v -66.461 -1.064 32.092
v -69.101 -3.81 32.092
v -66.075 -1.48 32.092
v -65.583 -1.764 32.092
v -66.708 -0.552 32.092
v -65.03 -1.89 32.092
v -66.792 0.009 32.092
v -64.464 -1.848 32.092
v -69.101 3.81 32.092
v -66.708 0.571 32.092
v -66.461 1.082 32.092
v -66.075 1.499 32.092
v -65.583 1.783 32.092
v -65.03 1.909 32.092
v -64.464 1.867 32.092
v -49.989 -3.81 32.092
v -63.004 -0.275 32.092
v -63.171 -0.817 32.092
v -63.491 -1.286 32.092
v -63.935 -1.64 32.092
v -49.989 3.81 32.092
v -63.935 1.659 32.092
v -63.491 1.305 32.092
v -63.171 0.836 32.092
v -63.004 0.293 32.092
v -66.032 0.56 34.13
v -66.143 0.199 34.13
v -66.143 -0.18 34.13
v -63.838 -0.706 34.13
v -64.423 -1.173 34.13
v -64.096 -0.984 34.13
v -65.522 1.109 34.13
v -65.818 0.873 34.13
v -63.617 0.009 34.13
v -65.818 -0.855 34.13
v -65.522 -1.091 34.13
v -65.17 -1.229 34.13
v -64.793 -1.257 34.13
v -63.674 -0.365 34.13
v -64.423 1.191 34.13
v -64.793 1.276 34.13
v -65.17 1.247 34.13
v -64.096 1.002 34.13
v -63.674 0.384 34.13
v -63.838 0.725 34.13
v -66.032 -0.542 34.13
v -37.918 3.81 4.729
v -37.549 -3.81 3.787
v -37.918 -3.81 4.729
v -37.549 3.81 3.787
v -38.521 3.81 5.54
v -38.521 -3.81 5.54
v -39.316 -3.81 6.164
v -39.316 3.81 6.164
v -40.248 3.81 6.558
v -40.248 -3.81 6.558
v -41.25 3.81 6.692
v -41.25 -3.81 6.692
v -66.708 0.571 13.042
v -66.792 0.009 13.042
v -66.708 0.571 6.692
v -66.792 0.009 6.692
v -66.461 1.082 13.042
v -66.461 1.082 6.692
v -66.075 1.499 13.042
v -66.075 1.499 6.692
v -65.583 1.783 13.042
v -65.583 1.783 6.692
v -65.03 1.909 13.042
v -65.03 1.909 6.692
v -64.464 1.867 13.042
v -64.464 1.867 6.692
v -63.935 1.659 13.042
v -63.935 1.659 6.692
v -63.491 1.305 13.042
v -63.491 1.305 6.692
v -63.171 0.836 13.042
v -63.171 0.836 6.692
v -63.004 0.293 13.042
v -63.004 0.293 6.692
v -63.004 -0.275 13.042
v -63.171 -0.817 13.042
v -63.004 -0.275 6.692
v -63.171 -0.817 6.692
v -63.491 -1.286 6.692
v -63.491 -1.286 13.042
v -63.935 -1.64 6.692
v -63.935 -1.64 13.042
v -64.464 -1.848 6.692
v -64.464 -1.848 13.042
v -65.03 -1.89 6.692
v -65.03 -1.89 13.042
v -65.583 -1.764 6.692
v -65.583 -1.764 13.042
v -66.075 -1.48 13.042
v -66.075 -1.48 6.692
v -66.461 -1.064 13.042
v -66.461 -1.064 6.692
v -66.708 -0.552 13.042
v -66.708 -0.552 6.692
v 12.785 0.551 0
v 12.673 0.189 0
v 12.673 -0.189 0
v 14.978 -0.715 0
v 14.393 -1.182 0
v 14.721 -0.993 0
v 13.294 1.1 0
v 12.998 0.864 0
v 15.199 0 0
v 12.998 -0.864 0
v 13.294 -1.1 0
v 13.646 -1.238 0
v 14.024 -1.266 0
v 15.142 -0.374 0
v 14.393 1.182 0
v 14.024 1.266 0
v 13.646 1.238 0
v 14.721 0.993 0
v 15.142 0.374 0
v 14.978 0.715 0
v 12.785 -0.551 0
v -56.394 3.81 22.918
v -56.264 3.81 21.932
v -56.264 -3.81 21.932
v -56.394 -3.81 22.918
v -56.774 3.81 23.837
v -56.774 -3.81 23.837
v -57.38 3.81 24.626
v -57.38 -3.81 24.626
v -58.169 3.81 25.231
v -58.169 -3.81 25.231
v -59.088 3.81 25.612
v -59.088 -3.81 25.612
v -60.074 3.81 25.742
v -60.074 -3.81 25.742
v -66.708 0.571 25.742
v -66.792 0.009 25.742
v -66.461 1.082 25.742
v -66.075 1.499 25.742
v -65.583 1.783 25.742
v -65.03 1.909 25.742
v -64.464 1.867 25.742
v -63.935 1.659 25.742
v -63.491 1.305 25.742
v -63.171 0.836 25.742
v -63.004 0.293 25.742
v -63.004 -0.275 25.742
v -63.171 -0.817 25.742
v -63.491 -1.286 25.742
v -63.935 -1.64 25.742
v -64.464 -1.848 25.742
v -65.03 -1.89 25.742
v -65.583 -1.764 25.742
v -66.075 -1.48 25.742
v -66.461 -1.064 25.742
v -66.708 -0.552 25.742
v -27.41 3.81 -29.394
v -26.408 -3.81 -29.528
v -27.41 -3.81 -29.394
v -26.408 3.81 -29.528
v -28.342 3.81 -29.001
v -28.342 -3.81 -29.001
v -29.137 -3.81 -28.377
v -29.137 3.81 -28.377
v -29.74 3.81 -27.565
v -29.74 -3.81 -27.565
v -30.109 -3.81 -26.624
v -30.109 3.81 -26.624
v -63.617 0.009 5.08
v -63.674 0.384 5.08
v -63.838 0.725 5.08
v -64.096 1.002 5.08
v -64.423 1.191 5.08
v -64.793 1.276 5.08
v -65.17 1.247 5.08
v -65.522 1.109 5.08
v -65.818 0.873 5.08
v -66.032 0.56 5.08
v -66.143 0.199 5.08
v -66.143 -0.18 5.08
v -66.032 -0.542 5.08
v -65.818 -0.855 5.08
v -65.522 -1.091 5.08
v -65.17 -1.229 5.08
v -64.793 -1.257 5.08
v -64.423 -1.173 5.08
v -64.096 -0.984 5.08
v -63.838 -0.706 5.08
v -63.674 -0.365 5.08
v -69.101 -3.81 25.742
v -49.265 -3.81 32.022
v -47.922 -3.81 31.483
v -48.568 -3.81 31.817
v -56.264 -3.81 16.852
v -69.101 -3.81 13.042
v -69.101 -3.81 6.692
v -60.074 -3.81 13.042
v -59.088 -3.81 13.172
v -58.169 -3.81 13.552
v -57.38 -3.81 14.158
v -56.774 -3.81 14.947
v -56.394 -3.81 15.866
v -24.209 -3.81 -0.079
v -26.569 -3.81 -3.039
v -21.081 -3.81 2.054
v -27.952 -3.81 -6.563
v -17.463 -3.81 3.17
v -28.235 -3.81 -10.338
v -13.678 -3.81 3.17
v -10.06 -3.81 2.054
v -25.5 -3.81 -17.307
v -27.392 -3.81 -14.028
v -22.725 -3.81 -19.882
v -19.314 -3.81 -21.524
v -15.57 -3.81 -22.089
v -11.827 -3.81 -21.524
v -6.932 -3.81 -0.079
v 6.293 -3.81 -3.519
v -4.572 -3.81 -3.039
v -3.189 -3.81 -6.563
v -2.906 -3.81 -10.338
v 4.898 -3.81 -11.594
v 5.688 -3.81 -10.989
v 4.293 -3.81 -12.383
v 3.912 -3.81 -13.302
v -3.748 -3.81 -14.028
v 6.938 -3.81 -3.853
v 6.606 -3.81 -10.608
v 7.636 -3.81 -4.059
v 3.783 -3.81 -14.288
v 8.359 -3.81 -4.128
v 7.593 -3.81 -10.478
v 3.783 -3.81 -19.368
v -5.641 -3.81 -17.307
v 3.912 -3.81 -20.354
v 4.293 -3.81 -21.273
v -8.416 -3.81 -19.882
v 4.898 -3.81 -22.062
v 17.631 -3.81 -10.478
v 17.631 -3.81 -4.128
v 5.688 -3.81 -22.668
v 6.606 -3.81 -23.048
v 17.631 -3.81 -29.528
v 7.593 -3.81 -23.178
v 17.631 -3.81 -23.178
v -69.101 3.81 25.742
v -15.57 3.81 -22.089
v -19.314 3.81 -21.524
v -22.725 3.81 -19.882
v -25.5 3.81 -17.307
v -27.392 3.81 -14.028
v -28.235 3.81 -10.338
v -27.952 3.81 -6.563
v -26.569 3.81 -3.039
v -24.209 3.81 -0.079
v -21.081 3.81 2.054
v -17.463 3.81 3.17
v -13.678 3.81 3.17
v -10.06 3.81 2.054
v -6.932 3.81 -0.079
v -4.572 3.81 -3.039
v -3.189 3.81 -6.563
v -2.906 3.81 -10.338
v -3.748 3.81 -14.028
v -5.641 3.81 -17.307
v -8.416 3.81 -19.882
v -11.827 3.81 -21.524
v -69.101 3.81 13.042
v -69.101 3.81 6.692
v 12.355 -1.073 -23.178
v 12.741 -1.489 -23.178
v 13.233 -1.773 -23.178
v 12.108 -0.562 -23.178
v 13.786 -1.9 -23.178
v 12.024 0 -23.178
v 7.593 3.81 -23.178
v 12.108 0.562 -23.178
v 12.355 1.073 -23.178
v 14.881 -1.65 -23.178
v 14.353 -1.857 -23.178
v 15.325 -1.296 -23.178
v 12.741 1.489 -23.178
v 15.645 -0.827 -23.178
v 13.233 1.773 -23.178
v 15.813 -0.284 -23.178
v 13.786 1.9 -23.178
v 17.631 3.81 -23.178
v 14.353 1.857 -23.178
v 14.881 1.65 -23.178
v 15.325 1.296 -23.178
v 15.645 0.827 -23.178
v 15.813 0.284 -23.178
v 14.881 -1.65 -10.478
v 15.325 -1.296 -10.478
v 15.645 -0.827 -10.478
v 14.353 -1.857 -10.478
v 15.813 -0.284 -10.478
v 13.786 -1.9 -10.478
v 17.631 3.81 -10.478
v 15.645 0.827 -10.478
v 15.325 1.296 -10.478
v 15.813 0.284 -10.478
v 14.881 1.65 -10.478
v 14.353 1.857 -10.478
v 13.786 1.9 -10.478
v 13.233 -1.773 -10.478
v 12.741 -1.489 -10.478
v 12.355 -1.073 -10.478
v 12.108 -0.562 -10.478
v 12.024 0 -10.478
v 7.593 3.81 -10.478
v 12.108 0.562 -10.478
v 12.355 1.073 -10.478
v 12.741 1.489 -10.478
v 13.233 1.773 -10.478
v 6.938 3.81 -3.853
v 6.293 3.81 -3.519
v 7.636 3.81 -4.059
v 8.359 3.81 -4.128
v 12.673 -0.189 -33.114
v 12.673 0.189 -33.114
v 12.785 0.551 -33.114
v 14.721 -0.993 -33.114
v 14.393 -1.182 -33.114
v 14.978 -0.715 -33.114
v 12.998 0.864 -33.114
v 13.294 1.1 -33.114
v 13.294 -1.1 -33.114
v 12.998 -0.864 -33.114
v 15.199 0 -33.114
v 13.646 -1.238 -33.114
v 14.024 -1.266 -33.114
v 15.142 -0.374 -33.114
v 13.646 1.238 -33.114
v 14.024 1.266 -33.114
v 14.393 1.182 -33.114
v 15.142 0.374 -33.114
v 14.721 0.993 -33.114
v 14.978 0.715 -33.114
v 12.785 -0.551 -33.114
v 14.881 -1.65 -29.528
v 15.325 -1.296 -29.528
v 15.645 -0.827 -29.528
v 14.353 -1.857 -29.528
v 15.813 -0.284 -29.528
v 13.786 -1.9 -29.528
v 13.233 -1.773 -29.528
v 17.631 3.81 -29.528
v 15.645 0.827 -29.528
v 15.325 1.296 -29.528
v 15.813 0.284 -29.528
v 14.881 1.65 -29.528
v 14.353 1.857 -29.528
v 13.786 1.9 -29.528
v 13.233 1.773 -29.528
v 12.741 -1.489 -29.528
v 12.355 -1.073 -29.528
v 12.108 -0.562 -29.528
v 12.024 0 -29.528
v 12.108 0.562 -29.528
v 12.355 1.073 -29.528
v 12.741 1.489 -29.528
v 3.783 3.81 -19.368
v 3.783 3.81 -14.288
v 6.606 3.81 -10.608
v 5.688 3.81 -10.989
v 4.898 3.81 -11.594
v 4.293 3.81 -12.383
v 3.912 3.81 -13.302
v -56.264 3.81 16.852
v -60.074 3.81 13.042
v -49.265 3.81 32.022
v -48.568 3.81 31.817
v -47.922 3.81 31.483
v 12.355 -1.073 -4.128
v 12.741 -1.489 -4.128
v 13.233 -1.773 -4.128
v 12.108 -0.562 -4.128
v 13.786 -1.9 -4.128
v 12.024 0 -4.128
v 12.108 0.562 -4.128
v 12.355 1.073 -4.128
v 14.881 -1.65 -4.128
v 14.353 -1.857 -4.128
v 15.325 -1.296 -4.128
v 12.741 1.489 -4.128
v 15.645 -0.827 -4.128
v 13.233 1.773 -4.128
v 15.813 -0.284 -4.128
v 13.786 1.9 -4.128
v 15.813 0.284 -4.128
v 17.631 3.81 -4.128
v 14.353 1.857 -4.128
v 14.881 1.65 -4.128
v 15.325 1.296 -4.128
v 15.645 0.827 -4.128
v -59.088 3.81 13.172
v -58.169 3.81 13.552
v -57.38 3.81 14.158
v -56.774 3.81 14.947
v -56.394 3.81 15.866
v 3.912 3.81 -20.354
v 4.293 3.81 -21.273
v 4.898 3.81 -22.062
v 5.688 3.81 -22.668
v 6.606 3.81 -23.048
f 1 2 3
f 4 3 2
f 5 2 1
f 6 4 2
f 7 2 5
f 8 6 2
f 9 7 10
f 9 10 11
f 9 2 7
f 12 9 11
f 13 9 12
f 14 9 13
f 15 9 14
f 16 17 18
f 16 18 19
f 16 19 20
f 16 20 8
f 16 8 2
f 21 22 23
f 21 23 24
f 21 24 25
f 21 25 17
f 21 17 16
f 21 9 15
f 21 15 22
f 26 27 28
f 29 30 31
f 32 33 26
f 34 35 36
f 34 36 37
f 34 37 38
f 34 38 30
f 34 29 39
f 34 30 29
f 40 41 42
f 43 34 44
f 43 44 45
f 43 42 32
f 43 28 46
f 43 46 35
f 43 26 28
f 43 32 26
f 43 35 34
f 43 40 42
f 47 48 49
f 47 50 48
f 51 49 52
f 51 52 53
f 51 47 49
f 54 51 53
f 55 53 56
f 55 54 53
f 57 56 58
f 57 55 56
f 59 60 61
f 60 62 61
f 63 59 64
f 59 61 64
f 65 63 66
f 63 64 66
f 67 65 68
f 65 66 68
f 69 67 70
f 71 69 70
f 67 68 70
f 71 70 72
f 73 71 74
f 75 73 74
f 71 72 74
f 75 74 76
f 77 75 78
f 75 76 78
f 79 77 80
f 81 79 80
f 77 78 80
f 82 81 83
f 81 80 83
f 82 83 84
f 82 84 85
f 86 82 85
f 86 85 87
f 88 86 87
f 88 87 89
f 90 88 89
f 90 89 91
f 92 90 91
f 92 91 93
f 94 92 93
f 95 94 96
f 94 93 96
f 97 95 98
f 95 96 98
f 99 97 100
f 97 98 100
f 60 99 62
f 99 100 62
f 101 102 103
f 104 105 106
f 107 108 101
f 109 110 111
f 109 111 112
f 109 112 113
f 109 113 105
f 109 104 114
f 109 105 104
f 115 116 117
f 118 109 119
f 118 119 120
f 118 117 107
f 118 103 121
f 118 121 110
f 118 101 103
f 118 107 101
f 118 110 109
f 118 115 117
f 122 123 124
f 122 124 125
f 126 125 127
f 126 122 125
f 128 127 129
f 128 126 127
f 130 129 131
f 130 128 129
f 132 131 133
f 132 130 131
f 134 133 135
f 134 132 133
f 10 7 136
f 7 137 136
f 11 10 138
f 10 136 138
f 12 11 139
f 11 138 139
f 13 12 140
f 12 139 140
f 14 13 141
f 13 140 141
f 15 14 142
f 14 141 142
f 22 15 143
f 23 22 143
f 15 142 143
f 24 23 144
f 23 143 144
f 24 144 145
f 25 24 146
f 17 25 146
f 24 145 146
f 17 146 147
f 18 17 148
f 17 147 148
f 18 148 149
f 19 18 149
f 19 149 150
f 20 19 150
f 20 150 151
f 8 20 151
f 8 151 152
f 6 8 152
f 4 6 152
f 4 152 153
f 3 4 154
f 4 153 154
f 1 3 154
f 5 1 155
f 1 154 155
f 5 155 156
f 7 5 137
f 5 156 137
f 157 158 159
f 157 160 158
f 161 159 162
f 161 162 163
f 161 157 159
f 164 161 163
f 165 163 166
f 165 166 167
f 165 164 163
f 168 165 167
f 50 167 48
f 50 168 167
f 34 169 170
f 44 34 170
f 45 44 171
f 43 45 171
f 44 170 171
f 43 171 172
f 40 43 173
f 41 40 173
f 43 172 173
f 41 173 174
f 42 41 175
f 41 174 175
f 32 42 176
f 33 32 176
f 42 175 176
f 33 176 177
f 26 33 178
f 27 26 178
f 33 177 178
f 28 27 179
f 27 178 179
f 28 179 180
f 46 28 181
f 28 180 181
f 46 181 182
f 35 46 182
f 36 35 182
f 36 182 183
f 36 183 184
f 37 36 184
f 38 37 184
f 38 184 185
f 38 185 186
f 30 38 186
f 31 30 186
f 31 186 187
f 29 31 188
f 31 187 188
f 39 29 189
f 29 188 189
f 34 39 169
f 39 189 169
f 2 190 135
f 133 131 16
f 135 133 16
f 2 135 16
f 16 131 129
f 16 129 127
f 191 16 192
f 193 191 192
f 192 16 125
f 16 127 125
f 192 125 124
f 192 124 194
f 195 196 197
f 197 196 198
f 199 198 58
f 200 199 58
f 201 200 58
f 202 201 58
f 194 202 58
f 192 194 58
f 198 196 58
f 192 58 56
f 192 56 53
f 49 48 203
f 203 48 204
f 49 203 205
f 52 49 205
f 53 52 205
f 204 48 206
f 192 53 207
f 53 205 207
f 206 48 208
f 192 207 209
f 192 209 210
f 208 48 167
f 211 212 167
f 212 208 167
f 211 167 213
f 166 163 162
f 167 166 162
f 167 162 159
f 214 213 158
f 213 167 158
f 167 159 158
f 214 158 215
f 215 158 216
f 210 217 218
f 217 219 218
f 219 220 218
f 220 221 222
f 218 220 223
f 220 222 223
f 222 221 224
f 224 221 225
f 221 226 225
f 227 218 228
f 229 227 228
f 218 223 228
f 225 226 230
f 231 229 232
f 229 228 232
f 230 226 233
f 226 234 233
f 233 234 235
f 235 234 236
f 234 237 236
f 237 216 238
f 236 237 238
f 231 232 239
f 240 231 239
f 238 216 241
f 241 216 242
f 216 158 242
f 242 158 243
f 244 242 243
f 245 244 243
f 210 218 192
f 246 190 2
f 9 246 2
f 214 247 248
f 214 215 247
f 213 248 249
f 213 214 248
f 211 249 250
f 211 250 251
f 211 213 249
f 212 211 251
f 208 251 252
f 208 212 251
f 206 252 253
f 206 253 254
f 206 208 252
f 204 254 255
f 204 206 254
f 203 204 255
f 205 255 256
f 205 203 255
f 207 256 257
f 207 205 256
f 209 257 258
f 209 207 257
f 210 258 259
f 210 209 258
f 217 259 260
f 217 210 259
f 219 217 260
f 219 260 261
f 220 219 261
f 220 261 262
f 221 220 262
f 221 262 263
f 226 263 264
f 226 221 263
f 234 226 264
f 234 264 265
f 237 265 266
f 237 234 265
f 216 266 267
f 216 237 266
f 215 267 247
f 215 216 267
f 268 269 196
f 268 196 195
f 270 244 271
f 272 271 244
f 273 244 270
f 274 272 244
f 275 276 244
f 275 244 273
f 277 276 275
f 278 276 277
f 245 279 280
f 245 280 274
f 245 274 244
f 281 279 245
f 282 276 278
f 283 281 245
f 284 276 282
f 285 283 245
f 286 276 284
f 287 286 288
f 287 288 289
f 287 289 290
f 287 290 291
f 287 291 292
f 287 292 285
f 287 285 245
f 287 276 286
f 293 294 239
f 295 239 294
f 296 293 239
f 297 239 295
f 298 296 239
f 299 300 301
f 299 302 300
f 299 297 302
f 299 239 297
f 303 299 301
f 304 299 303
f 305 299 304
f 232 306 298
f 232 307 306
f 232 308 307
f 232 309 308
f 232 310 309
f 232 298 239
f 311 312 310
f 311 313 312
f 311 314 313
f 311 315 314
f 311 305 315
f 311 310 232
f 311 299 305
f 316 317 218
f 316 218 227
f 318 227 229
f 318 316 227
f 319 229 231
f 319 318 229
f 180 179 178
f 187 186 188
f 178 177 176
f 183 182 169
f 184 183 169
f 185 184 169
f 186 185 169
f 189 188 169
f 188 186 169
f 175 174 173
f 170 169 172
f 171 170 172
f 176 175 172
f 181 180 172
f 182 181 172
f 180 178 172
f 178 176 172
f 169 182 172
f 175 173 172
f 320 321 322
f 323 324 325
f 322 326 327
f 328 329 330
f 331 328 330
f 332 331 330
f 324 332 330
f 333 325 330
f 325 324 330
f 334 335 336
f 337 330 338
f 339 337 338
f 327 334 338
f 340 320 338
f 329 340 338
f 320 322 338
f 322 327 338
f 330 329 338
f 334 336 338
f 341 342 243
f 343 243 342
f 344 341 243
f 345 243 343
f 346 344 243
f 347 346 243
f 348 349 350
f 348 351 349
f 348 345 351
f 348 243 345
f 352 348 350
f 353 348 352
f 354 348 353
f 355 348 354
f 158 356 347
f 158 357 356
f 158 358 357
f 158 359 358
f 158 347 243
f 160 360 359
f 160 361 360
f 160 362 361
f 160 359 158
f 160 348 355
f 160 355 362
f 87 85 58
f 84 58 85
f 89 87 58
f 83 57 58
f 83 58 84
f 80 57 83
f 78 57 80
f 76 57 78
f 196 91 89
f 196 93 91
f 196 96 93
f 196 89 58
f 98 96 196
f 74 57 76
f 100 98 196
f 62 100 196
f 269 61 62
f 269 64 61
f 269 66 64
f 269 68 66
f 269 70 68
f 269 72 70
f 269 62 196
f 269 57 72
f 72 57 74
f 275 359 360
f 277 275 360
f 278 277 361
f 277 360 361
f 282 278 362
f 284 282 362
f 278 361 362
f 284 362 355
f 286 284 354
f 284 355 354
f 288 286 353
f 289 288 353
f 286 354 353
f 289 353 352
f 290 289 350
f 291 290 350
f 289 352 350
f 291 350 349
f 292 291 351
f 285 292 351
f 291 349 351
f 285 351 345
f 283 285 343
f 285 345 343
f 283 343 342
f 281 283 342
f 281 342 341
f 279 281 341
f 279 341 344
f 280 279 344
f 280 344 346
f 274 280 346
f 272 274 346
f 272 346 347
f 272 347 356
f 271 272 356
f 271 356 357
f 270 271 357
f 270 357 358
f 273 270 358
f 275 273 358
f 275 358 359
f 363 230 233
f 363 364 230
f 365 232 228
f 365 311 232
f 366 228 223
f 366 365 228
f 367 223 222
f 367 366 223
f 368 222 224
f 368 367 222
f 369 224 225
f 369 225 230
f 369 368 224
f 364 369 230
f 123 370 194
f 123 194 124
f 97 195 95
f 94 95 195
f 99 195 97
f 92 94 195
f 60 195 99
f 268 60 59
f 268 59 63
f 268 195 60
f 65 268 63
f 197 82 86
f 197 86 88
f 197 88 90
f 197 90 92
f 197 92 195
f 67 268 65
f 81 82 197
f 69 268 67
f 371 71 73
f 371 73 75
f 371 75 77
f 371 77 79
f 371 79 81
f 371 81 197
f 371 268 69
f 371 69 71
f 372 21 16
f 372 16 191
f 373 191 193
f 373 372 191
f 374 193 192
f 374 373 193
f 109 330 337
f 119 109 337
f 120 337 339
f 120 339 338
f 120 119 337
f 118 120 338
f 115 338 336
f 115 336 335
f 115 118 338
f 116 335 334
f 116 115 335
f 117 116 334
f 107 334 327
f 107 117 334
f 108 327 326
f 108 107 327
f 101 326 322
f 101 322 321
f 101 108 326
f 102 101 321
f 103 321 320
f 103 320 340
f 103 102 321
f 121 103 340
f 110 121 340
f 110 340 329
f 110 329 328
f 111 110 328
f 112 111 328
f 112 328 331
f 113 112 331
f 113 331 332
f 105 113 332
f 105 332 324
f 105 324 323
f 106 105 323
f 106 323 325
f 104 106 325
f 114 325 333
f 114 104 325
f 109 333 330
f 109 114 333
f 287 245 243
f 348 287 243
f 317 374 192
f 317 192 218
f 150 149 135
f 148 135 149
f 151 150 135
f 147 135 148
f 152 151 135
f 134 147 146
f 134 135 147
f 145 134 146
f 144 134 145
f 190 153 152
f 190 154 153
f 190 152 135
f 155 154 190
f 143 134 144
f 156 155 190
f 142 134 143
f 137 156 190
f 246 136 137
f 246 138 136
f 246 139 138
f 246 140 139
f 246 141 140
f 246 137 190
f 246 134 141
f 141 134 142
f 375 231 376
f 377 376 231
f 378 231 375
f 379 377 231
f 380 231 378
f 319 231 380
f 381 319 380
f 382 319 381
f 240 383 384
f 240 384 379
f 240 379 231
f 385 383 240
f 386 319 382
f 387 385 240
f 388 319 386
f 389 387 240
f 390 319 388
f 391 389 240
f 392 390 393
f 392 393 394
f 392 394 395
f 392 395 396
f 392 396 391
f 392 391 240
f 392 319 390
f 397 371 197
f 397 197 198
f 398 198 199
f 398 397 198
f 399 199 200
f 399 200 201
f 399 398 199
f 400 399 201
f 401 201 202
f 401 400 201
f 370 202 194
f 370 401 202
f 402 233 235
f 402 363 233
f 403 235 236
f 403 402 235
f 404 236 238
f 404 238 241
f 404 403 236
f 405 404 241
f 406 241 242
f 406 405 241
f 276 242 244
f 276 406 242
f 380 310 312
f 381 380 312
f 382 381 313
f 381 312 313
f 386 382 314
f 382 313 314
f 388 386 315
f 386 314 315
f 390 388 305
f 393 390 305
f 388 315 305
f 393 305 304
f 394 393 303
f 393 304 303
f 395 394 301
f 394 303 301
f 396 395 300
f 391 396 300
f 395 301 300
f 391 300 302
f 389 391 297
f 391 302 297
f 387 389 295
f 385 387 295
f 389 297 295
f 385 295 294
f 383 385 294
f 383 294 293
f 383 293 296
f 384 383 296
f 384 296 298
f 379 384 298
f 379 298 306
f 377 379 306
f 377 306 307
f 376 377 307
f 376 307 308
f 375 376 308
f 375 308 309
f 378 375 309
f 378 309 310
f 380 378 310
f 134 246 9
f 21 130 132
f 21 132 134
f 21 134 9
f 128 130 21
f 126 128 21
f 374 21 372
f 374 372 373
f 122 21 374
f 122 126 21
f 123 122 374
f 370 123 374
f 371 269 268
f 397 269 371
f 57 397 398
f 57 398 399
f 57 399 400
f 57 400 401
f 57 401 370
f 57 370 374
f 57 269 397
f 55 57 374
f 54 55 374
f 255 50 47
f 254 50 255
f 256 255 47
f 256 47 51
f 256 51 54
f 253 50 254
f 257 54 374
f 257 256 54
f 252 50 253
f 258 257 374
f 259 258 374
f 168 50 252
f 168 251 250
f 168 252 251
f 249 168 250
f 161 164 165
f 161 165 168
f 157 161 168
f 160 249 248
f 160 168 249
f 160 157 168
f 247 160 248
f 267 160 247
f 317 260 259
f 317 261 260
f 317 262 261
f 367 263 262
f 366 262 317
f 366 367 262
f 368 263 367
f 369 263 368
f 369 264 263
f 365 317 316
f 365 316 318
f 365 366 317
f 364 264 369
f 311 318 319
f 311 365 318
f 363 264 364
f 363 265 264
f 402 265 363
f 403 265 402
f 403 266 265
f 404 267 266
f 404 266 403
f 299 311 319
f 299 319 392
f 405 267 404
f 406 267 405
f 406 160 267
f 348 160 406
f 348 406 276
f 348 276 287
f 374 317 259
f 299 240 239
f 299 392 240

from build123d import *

# Parameters (mm, degrees)
SKETCH21_R         = 12.7
EXTRUDE1_DEPTH     = 3.81
SKETCH22_R         = 1.905
CUT_EXTRUDE1_DEPTH = 91.7575
SKETCH23_R         = 1.27
EXTRUDE2_DEPTH     = 33.114
EXTRUDE3_START     = 5.08
SKETCH23_3_R       = 1.27
EXTRUDE3_DEPTH     = 29.05


with BuildPart() as part:
    # Sketch21 → Extrude1 (new, symmetric)
    with BuildSketch(Plane(origin=(0, 0, 0), x_dir=(1, 0, 0), z_dir=(0, 1, 0))):
        with BuildLine():
            Line((-41.250206389, -6.691679553), (-69.101430131, -6.691679553))
            Line((-69.101430131, -6.691679553), (-69.101430131, -13.041679553))
            Line((-69.101430131, -13.041679553), (-60.073763005, -13.041679553))
            ThreePointArc((-60.073763005, -13.041679553), (-57.379686169, -14.157602716), (-56.263763005, -16.851679553))
            Line((-56.263763005, -16.851679553), (-56.263763005, -21.931679553))
            ThreePointArc((-56.263763005, -21.931679553), (-57.379686169, -24.625756389), (-60.073763005, -25.741679553))
            Line((-60.073763005, -25.741679553), (-69.101430131, -25.741679553))
            Line((-69.101430131, -25.741679553), (-69.101430131, -32.091679553))
            Line((-69.101430131, -32.091679553), (-49.98896999, -32.091679553))
            ThreePointArc((-49.98896999, -32.091679553), (-48.911766071, -31.936229007), (-47.922463432, -31.482562344))
            Line((-47.922463432, -31.482562344), (6.292726052, 3.519045616))
            ThreePointArc((6.292726052, 3.519045616), (7.282028692, 3.972712279), (8.35923261, 4.128162824))
            Line((8.35923261, 4.128162824), (17.630956358, 4.128162824))
            Line((17.630956358, 4.128162824), (17.630956358, 10.478162824))
            Line((17.630956358, 10.478162824), (7.592541293, 10.478162824))
            ThreePointArc((7.592541293, 10.478162824), (4.898464456, 11.594085988), (3.782541293, 14.288162824))
            Line((3.782541293, 14.288162824), (3.782541293, 19.368162824))
            ThreePointArc((3.782541293, 19.368162824), (4.898464456, 22.062239661), (7.592541293, 23.178162824))
            Line((7.592541293, 23.178162824), (17.630956358, 23.178162824))
            Line((17.630956358, 23.178162824), (17.630956358, 29.528162824))
            Line((17.630956358, 29.528162824), (-26.407986655, 29.528162824))
            ThreePointArc((-26.407986655, 29.528162824), (-28.760244733, 28.715325138), (-30.108826164, 26.623638905))
            Line((-30.108826164, 26.623638905), (-37.549366881, -3.787155633))
            ThreePointArc((-37.549366881, -3.787155633), (-38.897948311, -5.878841866), (-41.250206389, -6.691679553))
        make_face()
        with Locations((-15.570369897, 9.388598571)):
            Circle(SKETCH21_R, mode=Mode.SUBTRACT)
    extrude(amount=EXTRUDE1_DEPTH, both=True)

    # Sketch22 → Cut-Extrude1 (cut, symmetric)
    with BuildSketch(Plane(origin=(0, 0, -29.528162824), x_dir=(-1, 0, 0), z_dir=(0, 0, -1))):
        with Locations((-13.928786076, 0)):
            Circle(SKETCH22_R)
        with Locations((64.887413377, 0.009280662)):
            Circle(SKETCH22_R)
    extrude(amount=CUT_EXTRUDE1_DEPTH, both=True, mode=Mode.SUBTRACT)


with BuildPart() as body_2:
    # Sketch23 → Extrude2 (new body)
    with BuildSketch(Plane.XY):
        with Locations((13.928786076, 0)):
            Circle(SKETCH23_R)
    extrude(amount=-EXTRUDE2_DEPTH)


with BuildPart() as body_3:
    # Sketch23<3> → Extrude3 (new body)
    with BuildSketch(Plane.XY.offset(EXTRUDE3_START)):
        with Locations((-64.887413377, 0.009280662)):
            Circle(SKETCH23_3_R)
    extrude(amount=EXTRUDE3_DEPTH)


solid = Compound([part.part, body_2.part, body_3.part])
